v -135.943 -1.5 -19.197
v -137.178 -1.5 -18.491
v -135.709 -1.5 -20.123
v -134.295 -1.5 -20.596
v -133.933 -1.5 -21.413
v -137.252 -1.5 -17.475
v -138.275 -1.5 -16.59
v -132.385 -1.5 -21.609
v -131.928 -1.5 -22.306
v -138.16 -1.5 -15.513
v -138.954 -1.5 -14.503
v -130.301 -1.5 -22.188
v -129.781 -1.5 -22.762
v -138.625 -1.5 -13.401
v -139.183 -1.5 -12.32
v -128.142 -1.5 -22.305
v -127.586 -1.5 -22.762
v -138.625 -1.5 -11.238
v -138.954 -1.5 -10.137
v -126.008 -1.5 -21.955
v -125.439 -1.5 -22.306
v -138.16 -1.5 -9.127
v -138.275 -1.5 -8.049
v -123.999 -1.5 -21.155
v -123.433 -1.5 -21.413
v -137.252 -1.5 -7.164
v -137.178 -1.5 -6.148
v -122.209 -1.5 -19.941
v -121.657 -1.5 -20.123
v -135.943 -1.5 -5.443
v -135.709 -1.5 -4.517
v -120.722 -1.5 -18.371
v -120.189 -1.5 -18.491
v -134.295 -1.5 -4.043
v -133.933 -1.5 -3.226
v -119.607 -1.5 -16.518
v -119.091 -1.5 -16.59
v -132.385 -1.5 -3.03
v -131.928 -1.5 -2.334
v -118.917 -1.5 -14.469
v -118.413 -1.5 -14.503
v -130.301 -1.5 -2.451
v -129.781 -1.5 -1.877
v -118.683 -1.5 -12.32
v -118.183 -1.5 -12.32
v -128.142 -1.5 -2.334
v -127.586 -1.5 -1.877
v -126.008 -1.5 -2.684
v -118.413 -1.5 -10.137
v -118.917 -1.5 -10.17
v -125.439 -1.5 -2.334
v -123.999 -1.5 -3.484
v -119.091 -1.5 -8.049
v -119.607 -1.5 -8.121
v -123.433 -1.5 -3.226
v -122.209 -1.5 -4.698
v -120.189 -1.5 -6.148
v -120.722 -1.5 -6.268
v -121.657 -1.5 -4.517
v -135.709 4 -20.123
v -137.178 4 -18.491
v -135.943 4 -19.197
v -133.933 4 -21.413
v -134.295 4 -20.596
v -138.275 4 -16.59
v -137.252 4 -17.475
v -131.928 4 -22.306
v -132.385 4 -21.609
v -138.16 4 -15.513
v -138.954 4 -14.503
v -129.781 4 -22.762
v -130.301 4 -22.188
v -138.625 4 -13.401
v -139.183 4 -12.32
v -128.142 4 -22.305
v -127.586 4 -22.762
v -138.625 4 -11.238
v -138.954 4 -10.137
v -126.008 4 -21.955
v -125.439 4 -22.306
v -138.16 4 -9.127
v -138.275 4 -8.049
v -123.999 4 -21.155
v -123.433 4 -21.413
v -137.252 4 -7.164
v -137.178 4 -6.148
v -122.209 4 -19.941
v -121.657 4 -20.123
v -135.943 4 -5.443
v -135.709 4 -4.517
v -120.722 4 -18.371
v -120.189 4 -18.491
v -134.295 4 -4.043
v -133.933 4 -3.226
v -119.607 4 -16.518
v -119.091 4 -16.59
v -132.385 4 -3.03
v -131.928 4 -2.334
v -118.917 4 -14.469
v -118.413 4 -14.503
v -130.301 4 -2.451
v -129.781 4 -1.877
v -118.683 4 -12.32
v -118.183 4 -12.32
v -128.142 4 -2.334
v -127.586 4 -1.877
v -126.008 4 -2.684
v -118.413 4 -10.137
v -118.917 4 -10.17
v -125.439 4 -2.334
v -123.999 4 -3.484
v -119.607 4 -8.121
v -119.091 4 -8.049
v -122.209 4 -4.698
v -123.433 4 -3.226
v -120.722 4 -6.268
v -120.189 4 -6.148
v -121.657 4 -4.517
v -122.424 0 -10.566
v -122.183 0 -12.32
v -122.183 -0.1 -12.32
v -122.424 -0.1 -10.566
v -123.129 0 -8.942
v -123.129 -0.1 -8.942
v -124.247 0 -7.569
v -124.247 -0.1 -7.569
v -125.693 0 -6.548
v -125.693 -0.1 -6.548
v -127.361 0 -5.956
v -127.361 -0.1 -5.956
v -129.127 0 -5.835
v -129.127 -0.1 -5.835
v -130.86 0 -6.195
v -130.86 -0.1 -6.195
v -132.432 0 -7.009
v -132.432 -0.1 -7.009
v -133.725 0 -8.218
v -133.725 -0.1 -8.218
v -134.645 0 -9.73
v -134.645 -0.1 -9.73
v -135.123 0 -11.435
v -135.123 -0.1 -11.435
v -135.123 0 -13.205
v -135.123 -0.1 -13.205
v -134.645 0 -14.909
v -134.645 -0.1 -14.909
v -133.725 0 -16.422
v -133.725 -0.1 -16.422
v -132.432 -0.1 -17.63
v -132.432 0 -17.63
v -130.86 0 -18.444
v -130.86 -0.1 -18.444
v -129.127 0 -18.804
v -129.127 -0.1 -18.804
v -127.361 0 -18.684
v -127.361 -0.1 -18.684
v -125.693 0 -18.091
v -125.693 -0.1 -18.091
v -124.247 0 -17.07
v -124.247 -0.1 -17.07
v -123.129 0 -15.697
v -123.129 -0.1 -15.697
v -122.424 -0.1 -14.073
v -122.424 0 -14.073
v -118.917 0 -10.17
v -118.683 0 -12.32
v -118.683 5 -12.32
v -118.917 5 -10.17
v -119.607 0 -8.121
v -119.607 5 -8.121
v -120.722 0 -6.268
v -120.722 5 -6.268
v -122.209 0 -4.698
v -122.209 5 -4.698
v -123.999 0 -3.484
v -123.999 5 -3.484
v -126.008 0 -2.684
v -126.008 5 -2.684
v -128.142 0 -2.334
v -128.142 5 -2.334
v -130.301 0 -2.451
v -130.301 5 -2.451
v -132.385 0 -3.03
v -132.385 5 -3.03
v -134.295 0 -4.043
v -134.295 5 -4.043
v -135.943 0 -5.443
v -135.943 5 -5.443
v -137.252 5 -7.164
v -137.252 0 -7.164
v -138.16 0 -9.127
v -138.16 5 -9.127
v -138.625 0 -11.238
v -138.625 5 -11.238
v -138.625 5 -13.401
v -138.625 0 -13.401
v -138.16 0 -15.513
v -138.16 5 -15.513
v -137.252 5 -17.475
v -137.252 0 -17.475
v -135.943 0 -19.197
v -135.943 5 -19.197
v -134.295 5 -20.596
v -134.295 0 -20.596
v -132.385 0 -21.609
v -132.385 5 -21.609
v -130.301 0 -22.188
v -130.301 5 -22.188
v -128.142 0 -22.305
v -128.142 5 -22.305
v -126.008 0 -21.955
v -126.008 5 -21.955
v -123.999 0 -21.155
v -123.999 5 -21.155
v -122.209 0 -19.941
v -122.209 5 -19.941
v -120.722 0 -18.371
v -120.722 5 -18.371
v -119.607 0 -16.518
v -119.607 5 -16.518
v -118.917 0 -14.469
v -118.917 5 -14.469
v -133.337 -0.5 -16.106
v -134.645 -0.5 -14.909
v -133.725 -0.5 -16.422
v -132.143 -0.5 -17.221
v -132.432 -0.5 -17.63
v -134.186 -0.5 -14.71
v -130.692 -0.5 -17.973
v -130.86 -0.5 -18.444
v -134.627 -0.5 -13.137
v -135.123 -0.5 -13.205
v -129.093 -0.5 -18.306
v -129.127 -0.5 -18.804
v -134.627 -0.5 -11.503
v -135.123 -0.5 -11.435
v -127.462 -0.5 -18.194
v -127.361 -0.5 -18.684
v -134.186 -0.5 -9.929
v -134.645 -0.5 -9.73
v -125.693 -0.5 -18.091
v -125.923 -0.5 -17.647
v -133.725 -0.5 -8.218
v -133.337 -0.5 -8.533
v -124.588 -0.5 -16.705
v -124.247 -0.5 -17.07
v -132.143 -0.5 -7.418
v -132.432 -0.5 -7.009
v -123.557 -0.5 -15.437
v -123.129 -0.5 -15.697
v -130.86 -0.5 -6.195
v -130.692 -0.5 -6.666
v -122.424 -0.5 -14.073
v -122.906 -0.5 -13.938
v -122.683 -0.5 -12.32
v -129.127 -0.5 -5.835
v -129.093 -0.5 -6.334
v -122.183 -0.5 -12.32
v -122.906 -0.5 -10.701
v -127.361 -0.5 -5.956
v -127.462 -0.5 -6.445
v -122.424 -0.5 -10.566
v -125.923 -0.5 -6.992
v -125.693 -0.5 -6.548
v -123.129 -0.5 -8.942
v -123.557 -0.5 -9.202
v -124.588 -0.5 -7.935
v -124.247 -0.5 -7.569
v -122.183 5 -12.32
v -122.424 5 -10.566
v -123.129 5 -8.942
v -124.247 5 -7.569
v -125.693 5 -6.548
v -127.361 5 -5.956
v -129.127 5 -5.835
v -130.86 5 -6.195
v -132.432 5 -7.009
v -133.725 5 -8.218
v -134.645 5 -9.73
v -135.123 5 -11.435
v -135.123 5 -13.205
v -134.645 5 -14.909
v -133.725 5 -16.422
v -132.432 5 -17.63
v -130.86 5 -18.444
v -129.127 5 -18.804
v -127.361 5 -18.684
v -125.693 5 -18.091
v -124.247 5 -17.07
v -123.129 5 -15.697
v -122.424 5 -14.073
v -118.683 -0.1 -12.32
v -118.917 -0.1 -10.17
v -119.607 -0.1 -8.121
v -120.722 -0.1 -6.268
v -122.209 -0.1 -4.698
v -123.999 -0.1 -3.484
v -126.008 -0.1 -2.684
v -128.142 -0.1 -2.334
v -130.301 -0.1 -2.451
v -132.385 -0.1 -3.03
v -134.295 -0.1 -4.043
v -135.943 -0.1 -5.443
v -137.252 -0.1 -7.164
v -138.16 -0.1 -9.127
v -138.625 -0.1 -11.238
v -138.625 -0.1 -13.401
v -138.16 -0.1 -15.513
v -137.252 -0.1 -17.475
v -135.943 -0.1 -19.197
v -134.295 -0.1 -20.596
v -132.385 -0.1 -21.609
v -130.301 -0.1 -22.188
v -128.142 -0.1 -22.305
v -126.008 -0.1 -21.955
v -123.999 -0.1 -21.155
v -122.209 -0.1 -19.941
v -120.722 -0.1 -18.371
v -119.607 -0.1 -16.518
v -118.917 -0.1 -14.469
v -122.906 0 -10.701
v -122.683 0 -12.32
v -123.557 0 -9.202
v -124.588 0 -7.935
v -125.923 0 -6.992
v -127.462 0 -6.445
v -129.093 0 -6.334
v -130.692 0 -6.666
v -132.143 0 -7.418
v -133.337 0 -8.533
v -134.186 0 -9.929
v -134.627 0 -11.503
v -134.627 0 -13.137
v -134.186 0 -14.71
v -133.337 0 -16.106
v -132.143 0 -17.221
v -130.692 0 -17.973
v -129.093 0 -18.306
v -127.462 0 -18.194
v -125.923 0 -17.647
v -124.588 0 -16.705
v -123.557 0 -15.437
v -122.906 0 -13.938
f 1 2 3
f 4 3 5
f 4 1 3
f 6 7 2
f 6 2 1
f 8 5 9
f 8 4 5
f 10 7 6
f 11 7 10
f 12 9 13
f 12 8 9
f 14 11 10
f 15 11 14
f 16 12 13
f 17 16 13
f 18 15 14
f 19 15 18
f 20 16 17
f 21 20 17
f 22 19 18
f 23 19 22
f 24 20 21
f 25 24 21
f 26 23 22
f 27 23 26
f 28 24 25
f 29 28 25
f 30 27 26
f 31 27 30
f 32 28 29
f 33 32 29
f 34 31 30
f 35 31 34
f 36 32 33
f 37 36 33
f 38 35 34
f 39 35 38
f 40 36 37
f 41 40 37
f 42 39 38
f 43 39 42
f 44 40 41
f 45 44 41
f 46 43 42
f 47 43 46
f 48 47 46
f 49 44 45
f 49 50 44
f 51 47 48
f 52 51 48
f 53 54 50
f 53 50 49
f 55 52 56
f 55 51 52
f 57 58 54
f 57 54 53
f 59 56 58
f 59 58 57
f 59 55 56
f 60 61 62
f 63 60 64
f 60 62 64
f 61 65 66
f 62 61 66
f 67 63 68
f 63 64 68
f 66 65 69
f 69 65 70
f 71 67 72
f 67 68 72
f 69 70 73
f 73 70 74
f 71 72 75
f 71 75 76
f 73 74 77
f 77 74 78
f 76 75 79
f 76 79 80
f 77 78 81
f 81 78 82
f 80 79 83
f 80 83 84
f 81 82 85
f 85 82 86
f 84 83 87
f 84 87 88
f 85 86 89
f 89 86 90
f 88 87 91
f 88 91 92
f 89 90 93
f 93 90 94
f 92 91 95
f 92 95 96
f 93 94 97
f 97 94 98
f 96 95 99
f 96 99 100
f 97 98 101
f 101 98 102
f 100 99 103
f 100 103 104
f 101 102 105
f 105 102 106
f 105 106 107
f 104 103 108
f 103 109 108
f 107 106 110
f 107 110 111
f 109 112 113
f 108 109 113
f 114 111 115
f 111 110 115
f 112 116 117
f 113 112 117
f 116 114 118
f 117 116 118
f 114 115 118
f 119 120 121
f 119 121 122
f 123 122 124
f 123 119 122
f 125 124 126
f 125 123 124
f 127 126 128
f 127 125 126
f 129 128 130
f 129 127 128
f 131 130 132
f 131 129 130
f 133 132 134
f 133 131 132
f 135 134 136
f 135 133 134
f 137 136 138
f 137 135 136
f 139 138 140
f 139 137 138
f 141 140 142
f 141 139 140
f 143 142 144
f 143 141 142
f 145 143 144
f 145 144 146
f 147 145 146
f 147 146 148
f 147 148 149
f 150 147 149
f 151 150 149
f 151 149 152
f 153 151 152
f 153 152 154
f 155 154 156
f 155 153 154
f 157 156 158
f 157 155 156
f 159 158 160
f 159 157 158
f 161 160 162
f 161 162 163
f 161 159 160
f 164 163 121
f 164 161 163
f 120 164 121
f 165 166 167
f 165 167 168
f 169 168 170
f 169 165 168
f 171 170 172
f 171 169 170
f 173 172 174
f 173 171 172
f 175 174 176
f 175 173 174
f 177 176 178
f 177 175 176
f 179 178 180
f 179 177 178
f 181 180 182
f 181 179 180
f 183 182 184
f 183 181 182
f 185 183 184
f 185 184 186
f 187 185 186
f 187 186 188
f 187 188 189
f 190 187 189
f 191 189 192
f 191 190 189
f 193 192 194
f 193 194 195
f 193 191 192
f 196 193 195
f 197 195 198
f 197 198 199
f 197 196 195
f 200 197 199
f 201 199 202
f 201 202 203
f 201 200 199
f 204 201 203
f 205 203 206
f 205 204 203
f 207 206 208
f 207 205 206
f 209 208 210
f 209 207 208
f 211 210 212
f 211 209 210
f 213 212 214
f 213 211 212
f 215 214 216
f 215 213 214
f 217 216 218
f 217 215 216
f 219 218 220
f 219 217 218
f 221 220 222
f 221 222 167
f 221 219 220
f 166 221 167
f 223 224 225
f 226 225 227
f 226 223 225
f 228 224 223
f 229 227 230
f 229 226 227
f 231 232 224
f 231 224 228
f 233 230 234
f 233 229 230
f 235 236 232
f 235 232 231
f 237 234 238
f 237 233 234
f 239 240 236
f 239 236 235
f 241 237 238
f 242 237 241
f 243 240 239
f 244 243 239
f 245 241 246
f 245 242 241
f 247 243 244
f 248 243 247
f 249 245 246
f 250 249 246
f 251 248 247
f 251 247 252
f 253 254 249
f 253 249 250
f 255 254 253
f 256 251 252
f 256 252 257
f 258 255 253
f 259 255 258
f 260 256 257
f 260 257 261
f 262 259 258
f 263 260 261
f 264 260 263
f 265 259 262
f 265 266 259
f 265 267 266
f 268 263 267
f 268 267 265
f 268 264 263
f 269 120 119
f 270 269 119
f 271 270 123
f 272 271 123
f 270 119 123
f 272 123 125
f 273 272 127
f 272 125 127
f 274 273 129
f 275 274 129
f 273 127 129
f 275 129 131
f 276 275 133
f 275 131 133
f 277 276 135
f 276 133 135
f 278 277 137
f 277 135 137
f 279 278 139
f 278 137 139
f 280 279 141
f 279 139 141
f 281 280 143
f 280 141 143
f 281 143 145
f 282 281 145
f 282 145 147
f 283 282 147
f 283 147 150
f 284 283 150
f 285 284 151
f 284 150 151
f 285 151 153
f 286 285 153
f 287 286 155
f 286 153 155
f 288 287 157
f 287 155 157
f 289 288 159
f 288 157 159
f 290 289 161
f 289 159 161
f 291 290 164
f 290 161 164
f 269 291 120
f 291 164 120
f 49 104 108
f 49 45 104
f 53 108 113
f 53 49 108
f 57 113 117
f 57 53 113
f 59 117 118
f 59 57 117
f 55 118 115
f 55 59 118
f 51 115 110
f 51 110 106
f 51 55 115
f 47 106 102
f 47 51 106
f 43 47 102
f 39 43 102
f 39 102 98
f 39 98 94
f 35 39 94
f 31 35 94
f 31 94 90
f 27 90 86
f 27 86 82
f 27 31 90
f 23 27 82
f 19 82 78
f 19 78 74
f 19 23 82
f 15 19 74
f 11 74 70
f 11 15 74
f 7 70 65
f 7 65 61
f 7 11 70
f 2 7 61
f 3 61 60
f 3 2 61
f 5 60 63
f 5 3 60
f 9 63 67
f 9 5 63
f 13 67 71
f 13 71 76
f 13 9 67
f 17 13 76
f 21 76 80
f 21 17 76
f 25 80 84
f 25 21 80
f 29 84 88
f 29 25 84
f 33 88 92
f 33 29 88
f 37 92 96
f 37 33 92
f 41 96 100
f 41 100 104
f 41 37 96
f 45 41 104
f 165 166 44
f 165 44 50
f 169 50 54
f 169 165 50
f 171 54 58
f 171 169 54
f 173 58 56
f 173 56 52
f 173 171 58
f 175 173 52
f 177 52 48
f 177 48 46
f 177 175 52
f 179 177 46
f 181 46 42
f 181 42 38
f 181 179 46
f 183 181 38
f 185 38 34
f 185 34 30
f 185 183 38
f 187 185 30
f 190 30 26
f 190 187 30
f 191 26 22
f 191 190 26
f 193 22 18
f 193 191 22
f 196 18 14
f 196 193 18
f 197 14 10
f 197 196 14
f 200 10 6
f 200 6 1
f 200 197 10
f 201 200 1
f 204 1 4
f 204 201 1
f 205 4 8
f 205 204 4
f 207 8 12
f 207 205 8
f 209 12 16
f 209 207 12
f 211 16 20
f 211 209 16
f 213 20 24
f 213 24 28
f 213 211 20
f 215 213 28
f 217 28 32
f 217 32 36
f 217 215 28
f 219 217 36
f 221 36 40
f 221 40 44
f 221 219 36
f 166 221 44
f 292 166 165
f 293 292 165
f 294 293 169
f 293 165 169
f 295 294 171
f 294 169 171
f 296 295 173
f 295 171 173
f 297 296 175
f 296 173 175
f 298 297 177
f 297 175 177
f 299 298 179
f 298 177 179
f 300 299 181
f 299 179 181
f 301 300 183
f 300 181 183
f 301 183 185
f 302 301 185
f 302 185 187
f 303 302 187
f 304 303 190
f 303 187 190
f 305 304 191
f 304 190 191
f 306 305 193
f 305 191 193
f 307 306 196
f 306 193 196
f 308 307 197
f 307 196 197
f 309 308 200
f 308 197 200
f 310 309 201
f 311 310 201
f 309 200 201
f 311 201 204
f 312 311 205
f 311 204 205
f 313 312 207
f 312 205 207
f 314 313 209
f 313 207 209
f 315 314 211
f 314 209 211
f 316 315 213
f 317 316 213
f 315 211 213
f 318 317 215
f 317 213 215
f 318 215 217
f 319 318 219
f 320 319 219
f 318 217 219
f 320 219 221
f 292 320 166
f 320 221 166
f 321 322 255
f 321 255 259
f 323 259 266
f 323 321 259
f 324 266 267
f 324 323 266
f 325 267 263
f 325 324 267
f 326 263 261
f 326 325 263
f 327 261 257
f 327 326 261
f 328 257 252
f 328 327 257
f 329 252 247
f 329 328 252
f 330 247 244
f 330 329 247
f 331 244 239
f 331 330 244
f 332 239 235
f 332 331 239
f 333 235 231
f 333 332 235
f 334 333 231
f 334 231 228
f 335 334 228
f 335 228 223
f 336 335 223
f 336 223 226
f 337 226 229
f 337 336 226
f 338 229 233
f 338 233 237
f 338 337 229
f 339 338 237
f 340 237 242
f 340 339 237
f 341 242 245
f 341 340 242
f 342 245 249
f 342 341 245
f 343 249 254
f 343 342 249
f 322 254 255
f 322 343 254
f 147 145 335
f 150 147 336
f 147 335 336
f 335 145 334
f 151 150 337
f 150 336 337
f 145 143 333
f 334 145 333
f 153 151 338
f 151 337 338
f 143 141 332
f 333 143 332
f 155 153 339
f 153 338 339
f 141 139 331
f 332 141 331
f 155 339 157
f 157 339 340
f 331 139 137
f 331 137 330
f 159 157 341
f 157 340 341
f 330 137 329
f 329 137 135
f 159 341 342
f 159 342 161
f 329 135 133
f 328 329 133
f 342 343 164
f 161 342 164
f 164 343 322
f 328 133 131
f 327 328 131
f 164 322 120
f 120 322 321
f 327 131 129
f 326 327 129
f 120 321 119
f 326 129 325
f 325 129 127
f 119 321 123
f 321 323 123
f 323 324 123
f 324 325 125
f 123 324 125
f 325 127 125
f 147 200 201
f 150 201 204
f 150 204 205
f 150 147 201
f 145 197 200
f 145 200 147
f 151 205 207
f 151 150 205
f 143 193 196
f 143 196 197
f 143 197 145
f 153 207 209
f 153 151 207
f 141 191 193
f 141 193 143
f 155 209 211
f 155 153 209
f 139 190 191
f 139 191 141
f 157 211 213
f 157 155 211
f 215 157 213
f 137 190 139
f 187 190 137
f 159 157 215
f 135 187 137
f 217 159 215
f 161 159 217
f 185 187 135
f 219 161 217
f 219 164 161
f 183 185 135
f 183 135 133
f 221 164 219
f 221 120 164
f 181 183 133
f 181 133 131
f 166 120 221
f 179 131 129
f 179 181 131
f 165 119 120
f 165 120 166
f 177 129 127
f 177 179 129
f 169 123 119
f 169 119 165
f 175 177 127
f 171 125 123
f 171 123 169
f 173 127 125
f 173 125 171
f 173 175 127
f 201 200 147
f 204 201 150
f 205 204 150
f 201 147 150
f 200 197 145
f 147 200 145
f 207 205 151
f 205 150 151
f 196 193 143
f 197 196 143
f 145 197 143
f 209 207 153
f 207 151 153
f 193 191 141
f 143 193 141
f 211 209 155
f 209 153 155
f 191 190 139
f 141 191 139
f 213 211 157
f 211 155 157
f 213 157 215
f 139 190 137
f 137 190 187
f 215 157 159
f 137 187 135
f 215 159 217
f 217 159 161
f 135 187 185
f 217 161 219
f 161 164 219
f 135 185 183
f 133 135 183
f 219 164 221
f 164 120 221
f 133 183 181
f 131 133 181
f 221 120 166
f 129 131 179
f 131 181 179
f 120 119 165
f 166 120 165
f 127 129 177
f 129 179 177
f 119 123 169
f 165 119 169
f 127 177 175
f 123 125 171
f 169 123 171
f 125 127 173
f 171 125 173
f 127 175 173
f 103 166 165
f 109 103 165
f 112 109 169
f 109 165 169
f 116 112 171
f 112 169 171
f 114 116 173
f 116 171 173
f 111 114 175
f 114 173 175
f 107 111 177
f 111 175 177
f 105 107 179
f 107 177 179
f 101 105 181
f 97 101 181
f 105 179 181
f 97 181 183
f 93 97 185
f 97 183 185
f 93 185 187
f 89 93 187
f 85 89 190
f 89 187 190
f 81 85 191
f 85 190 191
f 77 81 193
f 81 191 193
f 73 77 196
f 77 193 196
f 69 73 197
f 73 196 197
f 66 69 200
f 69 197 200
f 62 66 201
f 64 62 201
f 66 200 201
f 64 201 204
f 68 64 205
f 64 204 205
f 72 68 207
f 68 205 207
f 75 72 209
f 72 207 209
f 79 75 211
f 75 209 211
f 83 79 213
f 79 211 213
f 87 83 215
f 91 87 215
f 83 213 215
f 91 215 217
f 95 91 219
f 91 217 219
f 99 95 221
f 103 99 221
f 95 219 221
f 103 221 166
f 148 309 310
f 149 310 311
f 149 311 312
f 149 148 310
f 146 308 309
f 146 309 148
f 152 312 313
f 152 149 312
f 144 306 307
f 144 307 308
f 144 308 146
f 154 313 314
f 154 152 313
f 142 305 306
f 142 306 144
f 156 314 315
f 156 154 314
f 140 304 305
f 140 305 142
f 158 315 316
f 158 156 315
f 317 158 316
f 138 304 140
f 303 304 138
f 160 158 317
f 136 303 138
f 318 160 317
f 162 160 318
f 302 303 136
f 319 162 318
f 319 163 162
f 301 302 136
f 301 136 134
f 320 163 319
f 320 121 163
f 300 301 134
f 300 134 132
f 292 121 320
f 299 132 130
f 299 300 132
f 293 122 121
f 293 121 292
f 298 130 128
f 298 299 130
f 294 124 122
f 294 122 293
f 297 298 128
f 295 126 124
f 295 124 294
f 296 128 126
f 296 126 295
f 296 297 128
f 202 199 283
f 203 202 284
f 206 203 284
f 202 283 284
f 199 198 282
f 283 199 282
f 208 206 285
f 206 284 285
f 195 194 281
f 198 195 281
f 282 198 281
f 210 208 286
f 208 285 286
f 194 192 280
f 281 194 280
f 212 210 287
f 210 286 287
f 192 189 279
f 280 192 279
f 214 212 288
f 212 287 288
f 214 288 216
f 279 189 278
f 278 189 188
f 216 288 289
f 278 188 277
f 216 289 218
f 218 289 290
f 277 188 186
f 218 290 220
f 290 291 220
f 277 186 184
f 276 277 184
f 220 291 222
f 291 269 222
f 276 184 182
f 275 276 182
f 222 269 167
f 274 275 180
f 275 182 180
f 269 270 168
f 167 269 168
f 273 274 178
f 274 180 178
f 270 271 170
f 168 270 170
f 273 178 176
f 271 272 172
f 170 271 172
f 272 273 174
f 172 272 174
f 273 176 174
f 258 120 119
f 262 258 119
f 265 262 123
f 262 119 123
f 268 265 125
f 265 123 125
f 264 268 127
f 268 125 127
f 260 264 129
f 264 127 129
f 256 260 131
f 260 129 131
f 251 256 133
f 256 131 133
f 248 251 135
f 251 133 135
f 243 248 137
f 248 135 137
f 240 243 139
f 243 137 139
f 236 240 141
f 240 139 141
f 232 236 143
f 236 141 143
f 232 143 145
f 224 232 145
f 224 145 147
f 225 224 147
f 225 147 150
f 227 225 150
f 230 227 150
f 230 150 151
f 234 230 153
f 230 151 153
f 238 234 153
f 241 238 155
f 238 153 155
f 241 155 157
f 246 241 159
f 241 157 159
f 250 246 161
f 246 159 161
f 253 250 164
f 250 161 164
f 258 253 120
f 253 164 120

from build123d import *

# Parameters (mm, degrees)
F0_R          = 10.5
F0_R_2        = 10
F1_DEPTH      = 1.5
F1_DEPTH_BACK = 4
F0_R_3        = 6.5
F0_R_4        = 6
F2_DEPTH      = 0.5
F3_DEPTH      = 0.1
F4_DEPTH      = 5


with BuildPart() as f1:
    # F0 (on Front) → F1 (new body, two sides)
    with BuildSketch(Plane.XZ) as f1_sk:
        with Locations((-128.683195, -12.319595)):
            Circle(F0_R)
        with Locations((-128.683195, -12.319595)):
            Circle(F0_R_2, mode=Mode.SUBTRACT)
    extrude(amount=F1_DEPTH)
    extrude(f1_sk.sketch, amount=-F1_DEPTH_BACK)


with BuildPart() as f2:
    # F0 (on Front) → F2 (new body)
    with BuildSketch(Plane.XZ):
        with Locations((-128.683195, -12.319595)):
            Circle(F0_R_3)
        with Locations((-128.683195, -12.319595)):
            Circle(F0_R_4, mode=Mode.SUBTRACT)
    extrude(amount=F2_DEPTH)


with BuildPart() as f3:
    # F0 (on Front) → F3 (new body)
    with BuildSketch(Plane.XZ):
        with Locations((-128.683195, -12.319595)):
            Circle(F0_R_2)
        with Locations((-128.683195, -12.319595)):
            Circle(F0_R_3, mode=Mode.SUBTRACT)
    extrude(amount=F3_DEPTH)


with BuildPart() as f4:
    # F0 (on Front) → F4 (new body)
    with BuildSketch(Plane.XZ):
        with Locations((-128.683195, -12.319595)):
            Circle(F0_R_2)
        with Locations((-128.683195, -12.319595)):
            Circle(F0_R_3, mode=Mode.SUBTRACT)
    extrude(amount=-F4_DEPTH)


solid = Compound([f1.part, f2.part, f3.part, f4.part])
